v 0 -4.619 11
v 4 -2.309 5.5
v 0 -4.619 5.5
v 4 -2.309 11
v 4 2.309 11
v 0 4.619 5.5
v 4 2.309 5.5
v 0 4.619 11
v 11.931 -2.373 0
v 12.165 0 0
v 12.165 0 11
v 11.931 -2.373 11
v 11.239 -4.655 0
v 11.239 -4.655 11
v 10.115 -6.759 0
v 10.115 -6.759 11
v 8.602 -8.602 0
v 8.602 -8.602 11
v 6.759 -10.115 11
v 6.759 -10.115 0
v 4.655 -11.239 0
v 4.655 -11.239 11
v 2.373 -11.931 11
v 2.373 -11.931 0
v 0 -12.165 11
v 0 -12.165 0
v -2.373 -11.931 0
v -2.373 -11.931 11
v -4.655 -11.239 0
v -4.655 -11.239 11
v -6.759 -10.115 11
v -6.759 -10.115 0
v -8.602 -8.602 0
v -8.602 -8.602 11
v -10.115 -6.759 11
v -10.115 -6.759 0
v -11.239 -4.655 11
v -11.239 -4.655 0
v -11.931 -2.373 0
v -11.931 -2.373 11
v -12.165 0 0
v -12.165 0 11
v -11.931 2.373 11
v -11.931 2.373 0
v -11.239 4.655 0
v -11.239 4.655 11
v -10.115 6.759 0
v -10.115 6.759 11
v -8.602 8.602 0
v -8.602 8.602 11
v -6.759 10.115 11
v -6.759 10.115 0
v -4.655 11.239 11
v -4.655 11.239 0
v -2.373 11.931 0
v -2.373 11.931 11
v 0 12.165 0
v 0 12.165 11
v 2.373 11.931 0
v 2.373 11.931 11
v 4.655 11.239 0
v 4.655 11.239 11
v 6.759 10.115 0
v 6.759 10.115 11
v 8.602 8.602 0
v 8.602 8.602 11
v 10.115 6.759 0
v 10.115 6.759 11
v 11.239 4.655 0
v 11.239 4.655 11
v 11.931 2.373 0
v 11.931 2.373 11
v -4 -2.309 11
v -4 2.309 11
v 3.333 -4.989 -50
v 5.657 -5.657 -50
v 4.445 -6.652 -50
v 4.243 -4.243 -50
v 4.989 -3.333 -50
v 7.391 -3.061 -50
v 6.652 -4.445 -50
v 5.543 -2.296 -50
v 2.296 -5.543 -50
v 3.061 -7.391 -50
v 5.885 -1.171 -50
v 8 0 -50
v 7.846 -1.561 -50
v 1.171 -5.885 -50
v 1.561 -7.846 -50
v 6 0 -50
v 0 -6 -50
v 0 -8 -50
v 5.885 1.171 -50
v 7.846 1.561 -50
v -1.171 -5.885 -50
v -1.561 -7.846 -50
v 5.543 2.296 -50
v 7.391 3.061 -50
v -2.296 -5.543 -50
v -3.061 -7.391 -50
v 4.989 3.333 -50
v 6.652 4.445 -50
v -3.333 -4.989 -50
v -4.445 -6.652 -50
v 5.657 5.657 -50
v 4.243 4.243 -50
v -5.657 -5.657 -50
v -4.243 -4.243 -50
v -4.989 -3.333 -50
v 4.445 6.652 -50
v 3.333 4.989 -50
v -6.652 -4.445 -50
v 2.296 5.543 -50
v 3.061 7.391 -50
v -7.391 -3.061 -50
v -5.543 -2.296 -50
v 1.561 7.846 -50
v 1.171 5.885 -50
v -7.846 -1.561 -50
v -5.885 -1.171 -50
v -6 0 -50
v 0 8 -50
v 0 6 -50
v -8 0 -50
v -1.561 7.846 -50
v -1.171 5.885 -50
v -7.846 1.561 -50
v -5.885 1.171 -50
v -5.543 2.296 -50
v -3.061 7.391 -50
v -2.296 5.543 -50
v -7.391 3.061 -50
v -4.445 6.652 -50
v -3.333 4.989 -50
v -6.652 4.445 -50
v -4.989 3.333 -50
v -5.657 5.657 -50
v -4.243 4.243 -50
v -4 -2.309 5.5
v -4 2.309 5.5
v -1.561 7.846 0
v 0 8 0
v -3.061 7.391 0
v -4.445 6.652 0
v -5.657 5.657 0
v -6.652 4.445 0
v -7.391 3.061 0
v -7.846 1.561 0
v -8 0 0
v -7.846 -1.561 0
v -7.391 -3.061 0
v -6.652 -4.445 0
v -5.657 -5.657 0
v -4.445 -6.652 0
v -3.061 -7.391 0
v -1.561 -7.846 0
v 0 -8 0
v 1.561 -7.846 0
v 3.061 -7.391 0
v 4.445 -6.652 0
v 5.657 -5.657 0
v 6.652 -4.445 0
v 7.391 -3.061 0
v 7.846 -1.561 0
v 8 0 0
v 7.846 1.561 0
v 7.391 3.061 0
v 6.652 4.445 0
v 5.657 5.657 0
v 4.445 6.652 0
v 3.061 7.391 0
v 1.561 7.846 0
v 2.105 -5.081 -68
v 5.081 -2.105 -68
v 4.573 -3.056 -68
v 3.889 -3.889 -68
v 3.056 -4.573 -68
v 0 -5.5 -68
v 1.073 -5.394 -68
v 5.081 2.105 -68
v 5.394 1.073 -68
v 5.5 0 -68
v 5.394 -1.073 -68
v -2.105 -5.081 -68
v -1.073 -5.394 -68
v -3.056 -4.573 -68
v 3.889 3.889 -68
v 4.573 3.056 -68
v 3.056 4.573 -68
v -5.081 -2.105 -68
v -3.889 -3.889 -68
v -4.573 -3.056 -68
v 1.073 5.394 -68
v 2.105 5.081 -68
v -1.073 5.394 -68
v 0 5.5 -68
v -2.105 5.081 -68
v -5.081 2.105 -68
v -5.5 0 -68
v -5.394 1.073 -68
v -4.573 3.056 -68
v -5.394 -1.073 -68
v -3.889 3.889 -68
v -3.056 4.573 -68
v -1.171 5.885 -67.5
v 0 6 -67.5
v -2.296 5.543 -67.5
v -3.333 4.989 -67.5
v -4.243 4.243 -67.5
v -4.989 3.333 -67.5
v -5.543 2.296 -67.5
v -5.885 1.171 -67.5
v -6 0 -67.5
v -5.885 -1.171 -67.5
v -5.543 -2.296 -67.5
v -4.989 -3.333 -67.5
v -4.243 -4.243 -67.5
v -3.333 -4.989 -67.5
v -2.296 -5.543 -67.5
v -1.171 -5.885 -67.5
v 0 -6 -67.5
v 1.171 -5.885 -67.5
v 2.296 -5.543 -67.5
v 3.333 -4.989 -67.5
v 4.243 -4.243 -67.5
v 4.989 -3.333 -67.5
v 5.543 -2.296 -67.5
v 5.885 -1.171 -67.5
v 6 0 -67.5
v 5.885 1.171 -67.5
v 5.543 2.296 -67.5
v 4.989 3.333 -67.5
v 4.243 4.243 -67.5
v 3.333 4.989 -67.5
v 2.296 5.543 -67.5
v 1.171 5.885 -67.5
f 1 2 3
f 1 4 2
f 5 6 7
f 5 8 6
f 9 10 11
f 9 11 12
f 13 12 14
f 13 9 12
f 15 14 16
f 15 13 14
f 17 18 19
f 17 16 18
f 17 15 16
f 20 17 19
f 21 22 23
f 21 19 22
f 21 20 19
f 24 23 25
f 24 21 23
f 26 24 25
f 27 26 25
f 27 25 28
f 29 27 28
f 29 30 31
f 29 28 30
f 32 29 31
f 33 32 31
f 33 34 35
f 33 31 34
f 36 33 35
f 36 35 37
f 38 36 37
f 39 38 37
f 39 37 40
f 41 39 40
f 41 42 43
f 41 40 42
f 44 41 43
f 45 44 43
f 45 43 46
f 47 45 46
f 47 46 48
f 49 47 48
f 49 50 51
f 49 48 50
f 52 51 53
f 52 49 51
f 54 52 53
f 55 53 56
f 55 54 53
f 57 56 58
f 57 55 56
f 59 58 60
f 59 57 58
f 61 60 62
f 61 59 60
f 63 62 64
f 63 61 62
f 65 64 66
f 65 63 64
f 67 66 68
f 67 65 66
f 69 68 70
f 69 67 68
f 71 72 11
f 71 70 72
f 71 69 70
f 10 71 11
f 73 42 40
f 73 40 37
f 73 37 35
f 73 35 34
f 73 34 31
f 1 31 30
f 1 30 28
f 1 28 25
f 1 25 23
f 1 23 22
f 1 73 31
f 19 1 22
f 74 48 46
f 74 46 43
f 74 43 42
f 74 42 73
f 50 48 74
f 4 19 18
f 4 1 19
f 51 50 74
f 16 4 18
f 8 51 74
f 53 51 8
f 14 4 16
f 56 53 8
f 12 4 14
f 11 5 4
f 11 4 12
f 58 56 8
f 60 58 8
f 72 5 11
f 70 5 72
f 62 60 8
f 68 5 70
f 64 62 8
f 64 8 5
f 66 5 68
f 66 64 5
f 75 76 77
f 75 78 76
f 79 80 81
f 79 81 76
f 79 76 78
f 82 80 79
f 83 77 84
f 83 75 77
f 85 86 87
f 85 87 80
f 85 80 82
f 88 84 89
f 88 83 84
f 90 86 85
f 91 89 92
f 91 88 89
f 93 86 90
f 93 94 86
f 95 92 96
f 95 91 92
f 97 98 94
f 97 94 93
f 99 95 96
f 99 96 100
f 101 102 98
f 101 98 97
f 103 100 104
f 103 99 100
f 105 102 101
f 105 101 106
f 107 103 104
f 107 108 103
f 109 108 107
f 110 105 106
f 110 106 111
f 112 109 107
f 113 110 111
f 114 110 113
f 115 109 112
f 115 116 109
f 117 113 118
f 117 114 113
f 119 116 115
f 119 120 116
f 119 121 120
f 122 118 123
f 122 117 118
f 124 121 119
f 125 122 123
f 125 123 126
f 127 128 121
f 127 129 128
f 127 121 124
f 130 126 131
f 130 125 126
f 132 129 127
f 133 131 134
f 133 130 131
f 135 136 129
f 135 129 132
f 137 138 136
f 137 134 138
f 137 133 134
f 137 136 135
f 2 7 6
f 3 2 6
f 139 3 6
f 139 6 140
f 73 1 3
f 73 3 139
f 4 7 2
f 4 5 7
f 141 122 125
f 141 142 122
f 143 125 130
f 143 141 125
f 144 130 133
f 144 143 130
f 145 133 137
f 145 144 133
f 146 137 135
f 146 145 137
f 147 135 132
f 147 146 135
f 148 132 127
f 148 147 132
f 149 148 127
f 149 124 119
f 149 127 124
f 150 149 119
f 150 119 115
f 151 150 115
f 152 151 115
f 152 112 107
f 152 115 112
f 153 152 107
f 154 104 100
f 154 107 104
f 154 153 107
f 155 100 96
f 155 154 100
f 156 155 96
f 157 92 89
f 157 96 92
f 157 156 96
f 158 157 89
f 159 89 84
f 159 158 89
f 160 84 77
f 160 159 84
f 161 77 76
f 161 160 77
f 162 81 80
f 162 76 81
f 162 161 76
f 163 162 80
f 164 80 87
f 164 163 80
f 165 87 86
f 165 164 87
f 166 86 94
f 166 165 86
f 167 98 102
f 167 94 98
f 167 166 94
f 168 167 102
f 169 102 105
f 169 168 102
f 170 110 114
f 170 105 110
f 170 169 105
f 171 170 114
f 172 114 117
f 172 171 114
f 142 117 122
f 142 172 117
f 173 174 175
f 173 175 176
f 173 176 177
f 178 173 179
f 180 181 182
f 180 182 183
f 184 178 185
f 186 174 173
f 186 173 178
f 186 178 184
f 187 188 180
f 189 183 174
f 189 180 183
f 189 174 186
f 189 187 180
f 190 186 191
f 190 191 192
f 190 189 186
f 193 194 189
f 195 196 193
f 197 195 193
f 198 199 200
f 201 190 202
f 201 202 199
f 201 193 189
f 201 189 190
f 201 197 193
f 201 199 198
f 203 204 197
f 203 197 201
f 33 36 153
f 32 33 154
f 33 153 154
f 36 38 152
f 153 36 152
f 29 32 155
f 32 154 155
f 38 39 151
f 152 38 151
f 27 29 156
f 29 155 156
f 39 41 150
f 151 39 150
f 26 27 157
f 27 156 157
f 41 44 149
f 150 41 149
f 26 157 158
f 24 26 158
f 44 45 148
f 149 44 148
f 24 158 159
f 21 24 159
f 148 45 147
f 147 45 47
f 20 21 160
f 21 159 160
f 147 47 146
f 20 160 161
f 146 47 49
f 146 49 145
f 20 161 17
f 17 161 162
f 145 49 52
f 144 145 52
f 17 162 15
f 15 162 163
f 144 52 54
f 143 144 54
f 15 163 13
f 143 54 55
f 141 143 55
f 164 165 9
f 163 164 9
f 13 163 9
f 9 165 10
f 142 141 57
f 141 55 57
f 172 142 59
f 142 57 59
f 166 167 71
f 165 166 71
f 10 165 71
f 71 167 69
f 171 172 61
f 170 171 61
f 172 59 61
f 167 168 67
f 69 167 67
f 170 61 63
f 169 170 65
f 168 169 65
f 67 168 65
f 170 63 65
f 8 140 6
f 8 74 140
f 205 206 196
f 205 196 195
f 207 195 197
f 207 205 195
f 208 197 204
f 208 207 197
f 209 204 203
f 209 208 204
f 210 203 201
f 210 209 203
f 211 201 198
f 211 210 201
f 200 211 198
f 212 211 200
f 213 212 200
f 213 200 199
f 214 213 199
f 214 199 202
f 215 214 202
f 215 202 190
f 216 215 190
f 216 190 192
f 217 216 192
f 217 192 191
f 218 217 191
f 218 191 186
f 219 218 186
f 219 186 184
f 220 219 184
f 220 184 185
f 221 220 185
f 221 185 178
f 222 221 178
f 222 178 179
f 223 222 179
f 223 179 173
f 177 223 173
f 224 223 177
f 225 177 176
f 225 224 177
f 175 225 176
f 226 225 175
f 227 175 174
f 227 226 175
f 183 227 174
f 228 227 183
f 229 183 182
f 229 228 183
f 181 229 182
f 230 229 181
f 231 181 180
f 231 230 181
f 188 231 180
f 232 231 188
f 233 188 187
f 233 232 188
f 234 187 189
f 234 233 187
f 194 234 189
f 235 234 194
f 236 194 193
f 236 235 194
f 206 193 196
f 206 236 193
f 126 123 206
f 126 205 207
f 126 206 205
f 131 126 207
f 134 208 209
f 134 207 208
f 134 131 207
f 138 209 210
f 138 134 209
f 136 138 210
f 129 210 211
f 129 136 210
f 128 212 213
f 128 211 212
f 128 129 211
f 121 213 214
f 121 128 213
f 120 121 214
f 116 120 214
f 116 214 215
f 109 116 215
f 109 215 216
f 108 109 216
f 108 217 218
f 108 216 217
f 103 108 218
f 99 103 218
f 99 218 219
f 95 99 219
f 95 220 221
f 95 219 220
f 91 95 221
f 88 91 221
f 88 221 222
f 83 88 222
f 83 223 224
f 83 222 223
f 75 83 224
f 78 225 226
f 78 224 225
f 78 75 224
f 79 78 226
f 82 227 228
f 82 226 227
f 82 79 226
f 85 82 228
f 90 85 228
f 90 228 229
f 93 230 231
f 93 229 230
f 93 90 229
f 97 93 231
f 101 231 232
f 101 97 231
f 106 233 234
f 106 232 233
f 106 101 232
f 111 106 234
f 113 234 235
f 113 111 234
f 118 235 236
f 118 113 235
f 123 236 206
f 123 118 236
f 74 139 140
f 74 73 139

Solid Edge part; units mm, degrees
sketch "Sketch1" plane through (0, 0, 0) normal (0, 0, 1) x (1, 0, 0)
  circle A0 centre (0, 0) radius 12.165
  dimension "D1" = 24.33
extrude "Protrusion1" add sketch "Sketch1" along normal blind 11
sketch "Sketch2" plane through (0, 0, 11) normal (0, 0, 1) x (1, 0, 0)
  line L0 (0, -4.6188) -> (-4, -2.3094)
  line L1 (-4, -2.3094) -> (-4, 2.3094)
  line L2 (-4, 2.3094) -> (0, 4.6188)
  line L3 (0, 4.6188) -> (4, 2.3094)
  line L4 (4, 2.3094) -> (4, -2.3094)
  line L5 (4, -2.3094) -> (0, -4.6188)
  dimension "D1" = 8
extrude "Cutout1" cut sketch "Sketch2" against normal blind 5.5
sketch "Sketch3" plane through (0, 0, 0) normal (0, 0, -1) x (0, 1, 0)
  circle A0 centre (0, 0) radius 8
  dimension "D1" = 16
extrude "Protrusion2" add sketch "Sketch3" along normal blind 50
sketch "Sketch4" plane through (0, 0, -50) normal (0, 0, -1) x (0, 1, 0)
  circle A0 centre (0, 0) radius 6
  dimension "D1" = 12
extrude "Protrusion3" add sketch "Sketch4" along normal blind 18
chamfer "Chamfer1" distance 0.5 angle 45 1 edges at (0, -6, -68)
properties part number "131785"
